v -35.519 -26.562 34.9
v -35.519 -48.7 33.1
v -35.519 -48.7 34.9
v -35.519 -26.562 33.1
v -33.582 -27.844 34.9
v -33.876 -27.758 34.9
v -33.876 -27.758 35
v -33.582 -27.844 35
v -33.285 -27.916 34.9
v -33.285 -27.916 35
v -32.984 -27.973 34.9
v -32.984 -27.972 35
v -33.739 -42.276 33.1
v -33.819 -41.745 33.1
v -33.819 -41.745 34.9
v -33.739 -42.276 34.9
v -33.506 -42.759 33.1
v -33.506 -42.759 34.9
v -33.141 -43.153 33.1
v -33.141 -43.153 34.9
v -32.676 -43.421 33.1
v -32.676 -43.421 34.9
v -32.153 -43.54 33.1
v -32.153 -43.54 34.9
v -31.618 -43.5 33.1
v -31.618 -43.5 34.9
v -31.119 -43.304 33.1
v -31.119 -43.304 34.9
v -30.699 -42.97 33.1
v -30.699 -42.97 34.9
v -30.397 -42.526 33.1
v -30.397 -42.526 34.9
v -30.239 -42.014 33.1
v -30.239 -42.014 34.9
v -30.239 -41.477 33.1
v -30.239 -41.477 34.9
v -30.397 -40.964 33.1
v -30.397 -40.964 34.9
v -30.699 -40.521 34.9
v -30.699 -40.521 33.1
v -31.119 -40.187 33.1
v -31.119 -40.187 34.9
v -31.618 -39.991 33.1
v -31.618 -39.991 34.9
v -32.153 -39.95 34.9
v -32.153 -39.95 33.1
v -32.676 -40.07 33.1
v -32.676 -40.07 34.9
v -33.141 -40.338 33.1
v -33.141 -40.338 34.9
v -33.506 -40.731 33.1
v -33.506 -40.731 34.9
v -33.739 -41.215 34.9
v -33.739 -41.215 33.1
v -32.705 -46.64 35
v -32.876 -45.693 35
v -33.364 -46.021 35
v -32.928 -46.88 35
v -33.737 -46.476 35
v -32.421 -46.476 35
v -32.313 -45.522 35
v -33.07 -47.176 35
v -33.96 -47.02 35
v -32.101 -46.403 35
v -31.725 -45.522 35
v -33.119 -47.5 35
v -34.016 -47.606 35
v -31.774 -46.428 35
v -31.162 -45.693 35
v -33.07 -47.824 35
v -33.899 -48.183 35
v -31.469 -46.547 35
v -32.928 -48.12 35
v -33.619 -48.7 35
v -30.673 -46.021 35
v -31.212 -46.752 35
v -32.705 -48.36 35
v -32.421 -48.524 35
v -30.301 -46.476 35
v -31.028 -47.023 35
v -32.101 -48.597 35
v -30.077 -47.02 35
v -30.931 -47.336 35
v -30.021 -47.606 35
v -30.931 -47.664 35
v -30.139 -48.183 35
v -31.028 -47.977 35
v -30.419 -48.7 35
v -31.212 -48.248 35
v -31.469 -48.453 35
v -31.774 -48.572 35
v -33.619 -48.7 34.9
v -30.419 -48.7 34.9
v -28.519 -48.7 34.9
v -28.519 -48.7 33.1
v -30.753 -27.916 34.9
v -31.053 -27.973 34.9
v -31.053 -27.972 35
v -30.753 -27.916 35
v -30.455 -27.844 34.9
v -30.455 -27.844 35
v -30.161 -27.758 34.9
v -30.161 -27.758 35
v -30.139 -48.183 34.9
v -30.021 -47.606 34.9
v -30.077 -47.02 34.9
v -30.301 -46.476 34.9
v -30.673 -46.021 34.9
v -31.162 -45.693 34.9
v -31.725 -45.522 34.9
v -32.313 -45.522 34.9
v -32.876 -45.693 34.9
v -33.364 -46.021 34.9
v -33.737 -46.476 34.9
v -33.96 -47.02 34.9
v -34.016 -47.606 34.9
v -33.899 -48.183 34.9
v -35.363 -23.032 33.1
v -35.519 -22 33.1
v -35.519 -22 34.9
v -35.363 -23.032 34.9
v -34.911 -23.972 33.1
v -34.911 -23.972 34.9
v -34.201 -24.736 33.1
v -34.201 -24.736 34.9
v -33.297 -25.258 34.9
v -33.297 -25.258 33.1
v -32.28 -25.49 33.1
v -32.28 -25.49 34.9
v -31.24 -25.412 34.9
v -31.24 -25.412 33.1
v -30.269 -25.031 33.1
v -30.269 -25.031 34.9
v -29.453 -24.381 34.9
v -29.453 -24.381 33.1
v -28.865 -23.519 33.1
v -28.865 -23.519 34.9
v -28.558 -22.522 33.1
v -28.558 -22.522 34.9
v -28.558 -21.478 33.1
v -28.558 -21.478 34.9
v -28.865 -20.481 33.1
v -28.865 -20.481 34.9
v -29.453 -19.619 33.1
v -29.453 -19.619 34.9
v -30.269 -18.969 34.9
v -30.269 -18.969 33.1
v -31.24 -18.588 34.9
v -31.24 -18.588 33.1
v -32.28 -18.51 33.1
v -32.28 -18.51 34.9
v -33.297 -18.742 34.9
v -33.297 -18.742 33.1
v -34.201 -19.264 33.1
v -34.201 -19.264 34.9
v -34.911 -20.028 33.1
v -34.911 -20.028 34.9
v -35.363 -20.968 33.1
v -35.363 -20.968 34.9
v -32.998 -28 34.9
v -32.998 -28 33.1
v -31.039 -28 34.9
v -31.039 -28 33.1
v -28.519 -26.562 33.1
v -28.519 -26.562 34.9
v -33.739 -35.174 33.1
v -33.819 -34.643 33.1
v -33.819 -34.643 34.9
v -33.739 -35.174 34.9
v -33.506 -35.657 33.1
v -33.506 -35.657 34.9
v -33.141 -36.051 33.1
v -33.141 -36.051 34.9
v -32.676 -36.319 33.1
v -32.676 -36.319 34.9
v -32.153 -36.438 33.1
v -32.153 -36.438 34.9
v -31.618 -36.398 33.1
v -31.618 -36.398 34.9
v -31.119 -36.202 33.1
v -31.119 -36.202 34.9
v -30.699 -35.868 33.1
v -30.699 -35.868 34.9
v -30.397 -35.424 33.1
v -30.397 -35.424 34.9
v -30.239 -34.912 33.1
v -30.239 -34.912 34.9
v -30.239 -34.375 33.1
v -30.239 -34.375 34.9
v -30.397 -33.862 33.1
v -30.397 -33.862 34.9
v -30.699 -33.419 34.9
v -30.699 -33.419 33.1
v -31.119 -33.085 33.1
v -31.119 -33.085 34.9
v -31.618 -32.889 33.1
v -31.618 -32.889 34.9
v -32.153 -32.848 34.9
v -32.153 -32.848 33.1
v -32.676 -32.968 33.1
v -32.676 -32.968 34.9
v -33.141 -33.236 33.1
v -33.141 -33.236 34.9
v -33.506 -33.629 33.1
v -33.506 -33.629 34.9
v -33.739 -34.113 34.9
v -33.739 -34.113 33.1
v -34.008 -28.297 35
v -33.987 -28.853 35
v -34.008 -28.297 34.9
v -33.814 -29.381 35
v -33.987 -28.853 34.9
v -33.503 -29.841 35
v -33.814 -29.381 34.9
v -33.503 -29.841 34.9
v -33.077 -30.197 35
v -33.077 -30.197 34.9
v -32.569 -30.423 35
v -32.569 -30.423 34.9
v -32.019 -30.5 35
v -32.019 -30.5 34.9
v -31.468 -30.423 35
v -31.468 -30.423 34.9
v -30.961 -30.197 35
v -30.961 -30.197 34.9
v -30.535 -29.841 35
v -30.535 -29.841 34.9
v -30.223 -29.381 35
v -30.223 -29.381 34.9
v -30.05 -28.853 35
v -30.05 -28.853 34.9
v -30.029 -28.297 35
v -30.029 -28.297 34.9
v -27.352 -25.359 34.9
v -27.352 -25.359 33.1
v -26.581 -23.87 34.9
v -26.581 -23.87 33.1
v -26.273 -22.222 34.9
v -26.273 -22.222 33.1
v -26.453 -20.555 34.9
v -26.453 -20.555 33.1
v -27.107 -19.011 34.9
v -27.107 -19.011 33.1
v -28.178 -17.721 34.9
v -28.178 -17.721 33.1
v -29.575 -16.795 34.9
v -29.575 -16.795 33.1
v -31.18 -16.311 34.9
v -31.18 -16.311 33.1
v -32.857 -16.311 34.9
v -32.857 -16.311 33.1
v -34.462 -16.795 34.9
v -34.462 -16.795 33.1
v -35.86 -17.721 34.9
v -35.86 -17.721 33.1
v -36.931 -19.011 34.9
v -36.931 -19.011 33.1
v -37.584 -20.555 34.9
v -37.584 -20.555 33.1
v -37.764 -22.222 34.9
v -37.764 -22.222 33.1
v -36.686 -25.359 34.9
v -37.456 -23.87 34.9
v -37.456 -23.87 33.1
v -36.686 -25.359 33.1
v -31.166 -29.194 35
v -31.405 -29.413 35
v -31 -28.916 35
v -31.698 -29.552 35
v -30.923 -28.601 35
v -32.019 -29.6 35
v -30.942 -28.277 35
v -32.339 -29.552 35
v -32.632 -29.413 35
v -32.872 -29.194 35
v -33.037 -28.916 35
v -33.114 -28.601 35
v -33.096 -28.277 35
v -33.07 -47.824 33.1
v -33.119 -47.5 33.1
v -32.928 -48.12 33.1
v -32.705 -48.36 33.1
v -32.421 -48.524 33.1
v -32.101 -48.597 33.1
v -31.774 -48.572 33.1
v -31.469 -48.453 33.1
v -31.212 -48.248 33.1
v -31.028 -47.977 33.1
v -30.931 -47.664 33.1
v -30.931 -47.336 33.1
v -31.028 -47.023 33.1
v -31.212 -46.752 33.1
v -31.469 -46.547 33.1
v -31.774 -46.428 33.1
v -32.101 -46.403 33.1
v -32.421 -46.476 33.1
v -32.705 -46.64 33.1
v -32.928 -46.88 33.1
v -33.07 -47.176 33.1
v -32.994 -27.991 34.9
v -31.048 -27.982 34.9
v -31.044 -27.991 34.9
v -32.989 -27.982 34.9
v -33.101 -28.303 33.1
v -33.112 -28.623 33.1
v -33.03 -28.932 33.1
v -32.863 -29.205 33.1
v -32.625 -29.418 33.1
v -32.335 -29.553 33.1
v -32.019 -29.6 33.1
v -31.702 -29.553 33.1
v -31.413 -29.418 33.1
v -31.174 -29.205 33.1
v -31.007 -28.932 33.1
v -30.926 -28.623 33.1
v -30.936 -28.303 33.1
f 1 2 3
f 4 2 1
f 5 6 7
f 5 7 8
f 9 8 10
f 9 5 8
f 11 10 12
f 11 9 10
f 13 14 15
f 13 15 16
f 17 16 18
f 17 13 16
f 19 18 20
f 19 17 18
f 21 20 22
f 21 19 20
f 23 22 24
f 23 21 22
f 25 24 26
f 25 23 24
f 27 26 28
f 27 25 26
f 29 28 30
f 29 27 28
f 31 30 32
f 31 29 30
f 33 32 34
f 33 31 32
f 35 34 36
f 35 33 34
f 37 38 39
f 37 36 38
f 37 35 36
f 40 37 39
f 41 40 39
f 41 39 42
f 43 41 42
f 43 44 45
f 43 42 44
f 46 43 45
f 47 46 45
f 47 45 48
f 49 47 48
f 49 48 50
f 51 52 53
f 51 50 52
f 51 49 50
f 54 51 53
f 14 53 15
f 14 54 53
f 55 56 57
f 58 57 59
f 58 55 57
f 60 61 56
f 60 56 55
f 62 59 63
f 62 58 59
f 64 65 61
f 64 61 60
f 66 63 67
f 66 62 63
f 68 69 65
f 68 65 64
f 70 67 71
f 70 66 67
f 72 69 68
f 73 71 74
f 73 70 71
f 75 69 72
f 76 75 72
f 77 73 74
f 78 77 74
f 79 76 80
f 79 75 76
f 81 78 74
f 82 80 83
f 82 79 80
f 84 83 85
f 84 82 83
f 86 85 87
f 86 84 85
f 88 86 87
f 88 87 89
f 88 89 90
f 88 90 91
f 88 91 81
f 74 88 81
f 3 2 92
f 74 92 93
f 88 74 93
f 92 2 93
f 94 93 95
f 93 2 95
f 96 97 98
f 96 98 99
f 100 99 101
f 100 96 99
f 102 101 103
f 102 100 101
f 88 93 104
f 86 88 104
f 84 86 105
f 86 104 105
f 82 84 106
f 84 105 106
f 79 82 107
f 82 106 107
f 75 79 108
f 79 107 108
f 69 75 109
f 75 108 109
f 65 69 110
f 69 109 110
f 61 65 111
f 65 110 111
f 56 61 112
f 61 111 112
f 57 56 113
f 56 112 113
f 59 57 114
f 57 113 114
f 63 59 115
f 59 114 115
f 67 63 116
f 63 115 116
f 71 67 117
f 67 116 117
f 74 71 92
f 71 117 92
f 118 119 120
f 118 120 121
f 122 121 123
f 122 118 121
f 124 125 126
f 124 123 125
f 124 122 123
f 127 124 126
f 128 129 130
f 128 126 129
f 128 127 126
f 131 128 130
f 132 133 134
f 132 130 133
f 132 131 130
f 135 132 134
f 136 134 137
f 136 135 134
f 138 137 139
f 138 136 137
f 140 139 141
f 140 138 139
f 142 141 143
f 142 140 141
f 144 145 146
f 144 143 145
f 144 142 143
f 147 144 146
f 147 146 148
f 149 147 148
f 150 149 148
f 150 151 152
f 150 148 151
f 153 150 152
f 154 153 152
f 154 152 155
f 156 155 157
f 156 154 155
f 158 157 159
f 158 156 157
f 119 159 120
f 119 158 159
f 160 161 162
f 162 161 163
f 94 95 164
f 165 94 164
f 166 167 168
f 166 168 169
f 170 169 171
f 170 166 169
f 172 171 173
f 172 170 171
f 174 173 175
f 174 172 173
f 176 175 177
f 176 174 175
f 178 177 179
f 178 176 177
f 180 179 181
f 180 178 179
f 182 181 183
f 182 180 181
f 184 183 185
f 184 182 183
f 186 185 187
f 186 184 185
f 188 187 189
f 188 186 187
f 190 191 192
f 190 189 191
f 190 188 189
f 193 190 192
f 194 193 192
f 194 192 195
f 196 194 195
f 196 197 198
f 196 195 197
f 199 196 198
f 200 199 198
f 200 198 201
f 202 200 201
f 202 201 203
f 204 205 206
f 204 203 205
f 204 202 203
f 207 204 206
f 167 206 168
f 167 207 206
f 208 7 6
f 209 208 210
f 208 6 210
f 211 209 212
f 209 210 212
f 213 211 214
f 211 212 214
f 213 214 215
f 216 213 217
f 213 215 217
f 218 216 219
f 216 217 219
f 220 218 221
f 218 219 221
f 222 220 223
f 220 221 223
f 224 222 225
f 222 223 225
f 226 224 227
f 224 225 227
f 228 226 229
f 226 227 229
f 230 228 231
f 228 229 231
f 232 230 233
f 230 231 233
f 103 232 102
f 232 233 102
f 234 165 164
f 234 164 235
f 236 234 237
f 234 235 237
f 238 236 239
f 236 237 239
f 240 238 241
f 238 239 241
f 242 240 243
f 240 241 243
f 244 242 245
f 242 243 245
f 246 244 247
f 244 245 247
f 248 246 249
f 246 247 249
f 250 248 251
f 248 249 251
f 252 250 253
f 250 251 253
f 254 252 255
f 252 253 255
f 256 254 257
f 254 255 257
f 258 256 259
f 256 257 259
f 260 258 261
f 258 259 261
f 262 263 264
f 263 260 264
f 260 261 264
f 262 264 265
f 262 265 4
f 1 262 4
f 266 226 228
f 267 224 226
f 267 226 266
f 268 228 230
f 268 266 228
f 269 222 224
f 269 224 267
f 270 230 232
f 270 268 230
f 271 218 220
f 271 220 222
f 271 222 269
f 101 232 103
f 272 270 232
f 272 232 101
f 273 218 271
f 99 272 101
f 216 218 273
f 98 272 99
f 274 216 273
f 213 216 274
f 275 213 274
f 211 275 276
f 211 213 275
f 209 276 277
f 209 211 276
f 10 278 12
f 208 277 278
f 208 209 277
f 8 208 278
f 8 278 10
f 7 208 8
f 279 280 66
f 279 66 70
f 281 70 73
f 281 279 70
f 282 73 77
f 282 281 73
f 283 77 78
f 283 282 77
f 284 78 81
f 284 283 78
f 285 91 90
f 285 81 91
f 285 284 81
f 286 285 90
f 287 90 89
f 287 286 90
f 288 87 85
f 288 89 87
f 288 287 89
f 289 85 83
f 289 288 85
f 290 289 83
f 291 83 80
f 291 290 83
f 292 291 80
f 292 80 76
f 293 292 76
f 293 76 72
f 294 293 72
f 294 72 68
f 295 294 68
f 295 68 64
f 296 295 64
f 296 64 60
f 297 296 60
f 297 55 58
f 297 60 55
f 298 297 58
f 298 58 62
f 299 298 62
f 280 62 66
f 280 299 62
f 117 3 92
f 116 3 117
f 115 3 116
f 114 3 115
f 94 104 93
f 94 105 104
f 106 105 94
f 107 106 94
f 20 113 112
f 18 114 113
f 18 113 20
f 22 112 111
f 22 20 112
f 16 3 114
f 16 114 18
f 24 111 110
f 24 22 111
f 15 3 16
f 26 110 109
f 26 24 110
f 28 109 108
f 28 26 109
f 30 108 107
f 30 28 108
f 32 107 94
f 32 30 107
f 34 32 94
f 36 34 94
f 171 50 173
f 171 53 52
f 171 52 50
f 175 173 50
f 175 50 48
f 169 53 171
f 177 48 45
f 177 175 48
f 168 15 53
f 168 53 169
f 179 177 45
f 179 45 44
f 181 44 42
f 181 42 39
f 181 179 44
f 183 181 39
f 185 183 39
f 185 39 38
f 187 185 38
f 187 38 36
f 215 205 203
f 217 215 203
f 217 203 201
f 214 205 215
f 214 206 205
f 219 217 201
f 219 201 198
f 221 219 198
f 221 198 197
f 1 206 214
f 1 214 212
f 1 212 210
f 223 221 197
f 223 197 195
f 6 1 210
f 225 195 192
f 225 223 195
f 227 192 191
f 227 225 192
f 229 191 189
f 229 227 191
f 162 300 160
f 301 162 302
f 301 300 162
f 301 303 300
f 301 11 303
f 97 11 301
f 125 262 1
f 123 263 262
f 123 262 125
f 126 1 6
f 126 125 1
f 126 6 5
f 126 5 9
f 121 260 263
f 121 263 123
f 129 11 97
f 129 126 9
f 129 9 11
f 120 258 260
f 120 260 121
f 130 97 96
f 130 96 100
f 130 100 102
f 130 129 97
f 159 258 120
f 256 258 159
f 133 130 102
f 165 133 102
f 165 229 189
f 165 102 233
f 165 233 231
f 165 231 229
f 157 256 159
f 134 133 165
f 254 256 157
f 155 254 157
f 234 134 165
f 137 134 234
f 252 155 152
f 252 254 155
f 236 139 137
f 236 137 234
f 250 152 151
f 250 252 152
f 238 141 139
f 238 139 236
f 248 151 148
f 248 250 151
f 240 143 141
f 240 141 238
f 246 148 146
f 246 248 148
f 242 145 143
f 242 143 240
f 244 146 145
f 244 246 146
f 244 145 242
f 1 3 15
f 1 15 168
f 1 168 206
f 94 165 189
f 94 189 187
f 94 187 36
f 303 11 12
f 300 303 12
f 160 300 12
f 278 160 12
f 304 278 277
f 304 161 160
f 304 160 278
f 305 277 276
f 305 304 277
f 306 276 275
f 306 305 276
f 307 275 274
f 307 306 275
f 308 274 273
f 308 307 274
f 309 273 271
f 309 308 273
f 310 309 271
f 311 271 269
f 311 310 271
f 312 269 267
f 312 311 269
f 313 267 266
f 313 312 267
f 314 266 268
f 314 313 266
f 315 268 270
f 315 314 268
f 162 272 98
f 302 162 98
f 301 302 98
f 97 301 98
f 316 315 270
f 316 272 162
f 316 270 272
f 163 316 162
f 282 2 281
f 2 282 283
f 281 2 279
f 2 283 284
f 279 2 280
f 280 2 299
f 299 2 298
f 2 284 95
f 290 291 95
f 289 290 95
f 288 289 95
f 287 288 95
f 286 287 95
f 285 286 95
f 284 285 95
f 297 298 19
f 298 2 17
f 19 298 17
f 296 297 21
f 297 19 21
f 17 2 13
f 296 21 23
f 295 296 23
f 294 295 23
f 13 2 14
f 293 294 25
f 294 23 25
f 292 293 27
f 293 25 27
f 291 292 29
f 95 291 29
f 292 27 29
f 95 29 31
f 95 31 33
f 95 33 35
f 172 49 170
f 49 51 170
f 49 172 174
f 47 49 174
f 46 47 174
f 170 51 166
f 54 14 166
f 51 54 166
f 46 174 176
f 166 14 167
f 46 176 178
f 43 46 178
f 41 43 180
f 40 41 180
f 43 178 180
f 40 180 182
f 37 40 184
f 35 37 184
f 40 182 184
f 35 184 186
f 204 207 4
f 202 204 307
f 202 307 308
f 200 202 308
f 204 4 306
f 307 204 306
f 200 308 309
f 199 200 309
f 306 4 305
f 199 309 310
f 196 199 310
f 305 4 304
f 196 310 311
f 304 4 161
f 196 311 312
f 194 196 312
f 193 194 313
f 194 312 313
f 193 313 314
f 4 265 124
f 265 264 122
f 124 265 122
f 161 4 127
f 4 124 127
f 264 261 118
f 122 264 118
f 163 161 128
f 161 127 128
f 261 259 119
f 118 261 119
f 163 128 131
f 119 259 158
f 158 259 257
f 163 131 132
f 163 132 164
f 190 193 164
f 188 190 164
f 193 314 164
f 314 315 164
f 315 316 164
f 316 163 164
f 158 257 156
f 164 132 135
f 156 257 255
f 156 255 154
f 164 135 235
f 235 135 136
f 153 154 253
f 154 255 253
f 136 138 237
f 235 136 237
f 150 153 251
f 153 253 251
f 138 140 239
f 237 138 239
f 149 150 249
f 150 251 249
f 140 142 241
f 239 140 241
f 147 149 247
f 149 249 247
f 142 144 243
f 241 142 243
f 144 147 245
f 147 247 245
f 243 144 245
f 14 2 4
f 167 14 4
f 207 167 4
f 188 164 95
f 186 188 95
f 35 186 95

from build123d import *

# Parameters (mm, degrees)
RETAINER_PLATE_START                       = 33.1
SKETCH1_W                                  = 7
SKETCH1_H                                  = 23
RETAINER_PLATE_DEPTH                       = 1.8
RETAINER_MOUNTING_SPACERS_START            = 34.9
SKETCH2_R                                  = 2
RETAINER_MOUNTING_SPACERS_DEPTH            = 0.1
RETAINER_CLEARANCE_HOLES_START             = 32
SKETCH3_R                                  = 1.7
SKETCH3_R_2                                = 1.1
RETAINER_CLEARANCE_HOLES_DEPTH             = 6
CLEAR_END_WALL_START                       = 33
SKETCH4_W                                  = 15
SKETCH4_H                                  = 6.3
CLEAR_END_WALL_DEPTH                       = 6
THUMB_MOUNT_EXTENSION_START                = 33.1
SKETCH5_W                                  = 7
SKETCH5_H                                  = 6
THUMB_MOUNT_EXTENSION_DEPTH                = 1.8
THUMB_MOUNT_PAD_START                      = 33.1
SKETCH6_R                                  = 5.75
THUMB_MOUNT_PAD_DEPTH                      = 1.8
THUMB_CLEARANCE_D7_START                   = 32.8
SKETCH7_R                                  = 3.5
THUMB_CLEARANCE_D7_DEPTH                   = 2.5
CLEAR_LEGACY_SPACER_FROM_THUMB_BOSS_START  = 34.9
SKETCH8_R                                  = 6.05
CLEAR_LEGACY_SPACER_FROM_THUMB_BOSS_DEPTH  = 2.3
FREE_SLIDING_BUTTON_LOWER_GUIDE_D3P6_START = 33
SKETCH9_R                                  = 1.8
FREE_SLIDING_BUTTON_LOWER_GUIDE_D3P6_DEPTH = 2
CUT_EXTRUDE2_START                         = 33
SKETCH10_R                                 = 1.8
CUT_EXTRUDE2_DEPTH                         = 2


with BuildPart() as part:
    # Sketch1 → Retainer_plate (new body)
    with BuildSketch(Plane.XY.offset(RETAINER_PLATE_START)):
        with Locations((-32.018684277, -38)):
            Rectangle(SKETCH1_W, SKETCH1_H)
    extrude(amount=RETAINER_PLATE_DEPTH)

    # Sketch2 → Retainer_mounting_spacers (add)
    with BuildSketch(Plane.XY.offset(RETAINER_MOUNTING_SPACERS_START)):
        with Locations(Location((-32.018684277, -47.5, 0), (0, 0, 270))):
            Circle(SKETCH2_R)
        with Locations(Location((-32.018684277, -28.5, 0), (0, 0, 90))):
            Circle(SKETCH2_R)
    extrude(amount=RETAINER_MOUNTING_SPACERS_DEPTH)

    # Sketch3 → Retainer_clearance_holes (cut)
    with BuildSketch(Plane.XY.offset(RETAINER_CLEARANCE_HOLES_START)):
        with Locations(Location((-32.018684277, -41.745416557, 0), (0, 0, 180))):
            Circle(SKETCH3_R)
        with Locations(Location((-32.018684277, -34.643402341, 0), (0, 0, 180))):
            Circle(SKETCH3_R)
        with Locations(Location((-32.018684277, -47.5, 0), (0, 0, 180))):
            Circle(SKETCH3_R_2)
        with Locations(Location((-32.018684277, -28.5, 0), (0, 0, 180))):
            Circle(SKETCH3_R_2)
    extrude(amount=RETAINER_CLEARANCE_HOLES_DEPTH, mode=Mode.SUBTRACT)

    # Sketch4 → Clear_end_wall (cut)
    with BuildSketch(Plane.XY.offset(CLEAR_END_WALL_START)):
        with Locations((-32.5, -51.85)):
            Rectangle(SKETCH4_W, SKETCH4_H)
    extrude(amount=CLEAR_END_WALL_DEPTH, mode=Mode.SUBTRACT)

    # Sketch5 → Thumb_mount_extension (add)
    with BuildSketch(Plane.XY.offset(THUMB_MOUNT_EXTENSION_START)):
        with Locations((-32.018684277, -25)):
            Rectangle(SKETCH5_W, SKETCH5_H)
    extrude(amount=THUMB_MOUNT_EXTENSION_DEPTH)

    # Sketch6 → Thumb_mount_pad (add)
    with BuildSketch(Plane.XY.offset(THUMB_MOUNT_PAD_START)):
        with Locations((-32.018684277, -22)):
            Circle(SKETCH6_R)
    extrude(amount=THUMB_MOUNT_PAD_DEPTH)

    # Sketch7 → Thumb_clearance_D7 (cut)
    with BuildSketch(Plane.XY.offset(THUMB_CLEARANCE_D7_START)):
        with Locations(Location((-32.018684277, -22, 0), (0, 0, 180))):
            Circle(SKETCH7_R)
    extrude(amount=THUMB_CLEARANCE_D7_DEPTH, mode=Mode.SUBTRACT)

    # Sketch8 → Clear_legacy_spacer_from_thumb_boss (cut)
    with BuildSketch(Plane.XY.offset(CLEAR_LEGACY_SPACER_FROM_THUMB_BOSS_START)):
        with Locations((-32.018684277, -22)):
            Circle(SKETCH8_R)
    extrude(amount=CLEAR_LEGACY_SPACER_FROM_THUMB_BOSS_DEPTH, mode=Mode.SUBTRACT)

    # Sketch9 → Free_sliding_button_lower_guide_D3p6 (cut)
    with BuildSketch(Plane.XY.offset(FREE_SLIDING_BUTTON_LOWER_GUIDE_D3P6_START)):
        with Locations(Location((-32.018684277, -41.745416557, 0), (0, 0, 180))):
            Circle(SKETCH9_R)
    extrude(amount=FREE_SLIDING_BUTTON_LOWER_GUIDE_D3P6_DEPTH, mode=Mode.SUBTRACT)

    # Sketch10 → Cut-Extrude2 (cut)
    with BuildSketch(Plane.XY.offset(CUT_EXTRUDE2_START)):
        with Locations(Location((-32.018684277, -34.643402341, 0), (0, 0, 180))):
            Circle(SKETCH10_R)
    extrude(amount=CUT_EXTRUDE2_DEPTH, mode=Mode.SUBTRACT)


solid = part.part
